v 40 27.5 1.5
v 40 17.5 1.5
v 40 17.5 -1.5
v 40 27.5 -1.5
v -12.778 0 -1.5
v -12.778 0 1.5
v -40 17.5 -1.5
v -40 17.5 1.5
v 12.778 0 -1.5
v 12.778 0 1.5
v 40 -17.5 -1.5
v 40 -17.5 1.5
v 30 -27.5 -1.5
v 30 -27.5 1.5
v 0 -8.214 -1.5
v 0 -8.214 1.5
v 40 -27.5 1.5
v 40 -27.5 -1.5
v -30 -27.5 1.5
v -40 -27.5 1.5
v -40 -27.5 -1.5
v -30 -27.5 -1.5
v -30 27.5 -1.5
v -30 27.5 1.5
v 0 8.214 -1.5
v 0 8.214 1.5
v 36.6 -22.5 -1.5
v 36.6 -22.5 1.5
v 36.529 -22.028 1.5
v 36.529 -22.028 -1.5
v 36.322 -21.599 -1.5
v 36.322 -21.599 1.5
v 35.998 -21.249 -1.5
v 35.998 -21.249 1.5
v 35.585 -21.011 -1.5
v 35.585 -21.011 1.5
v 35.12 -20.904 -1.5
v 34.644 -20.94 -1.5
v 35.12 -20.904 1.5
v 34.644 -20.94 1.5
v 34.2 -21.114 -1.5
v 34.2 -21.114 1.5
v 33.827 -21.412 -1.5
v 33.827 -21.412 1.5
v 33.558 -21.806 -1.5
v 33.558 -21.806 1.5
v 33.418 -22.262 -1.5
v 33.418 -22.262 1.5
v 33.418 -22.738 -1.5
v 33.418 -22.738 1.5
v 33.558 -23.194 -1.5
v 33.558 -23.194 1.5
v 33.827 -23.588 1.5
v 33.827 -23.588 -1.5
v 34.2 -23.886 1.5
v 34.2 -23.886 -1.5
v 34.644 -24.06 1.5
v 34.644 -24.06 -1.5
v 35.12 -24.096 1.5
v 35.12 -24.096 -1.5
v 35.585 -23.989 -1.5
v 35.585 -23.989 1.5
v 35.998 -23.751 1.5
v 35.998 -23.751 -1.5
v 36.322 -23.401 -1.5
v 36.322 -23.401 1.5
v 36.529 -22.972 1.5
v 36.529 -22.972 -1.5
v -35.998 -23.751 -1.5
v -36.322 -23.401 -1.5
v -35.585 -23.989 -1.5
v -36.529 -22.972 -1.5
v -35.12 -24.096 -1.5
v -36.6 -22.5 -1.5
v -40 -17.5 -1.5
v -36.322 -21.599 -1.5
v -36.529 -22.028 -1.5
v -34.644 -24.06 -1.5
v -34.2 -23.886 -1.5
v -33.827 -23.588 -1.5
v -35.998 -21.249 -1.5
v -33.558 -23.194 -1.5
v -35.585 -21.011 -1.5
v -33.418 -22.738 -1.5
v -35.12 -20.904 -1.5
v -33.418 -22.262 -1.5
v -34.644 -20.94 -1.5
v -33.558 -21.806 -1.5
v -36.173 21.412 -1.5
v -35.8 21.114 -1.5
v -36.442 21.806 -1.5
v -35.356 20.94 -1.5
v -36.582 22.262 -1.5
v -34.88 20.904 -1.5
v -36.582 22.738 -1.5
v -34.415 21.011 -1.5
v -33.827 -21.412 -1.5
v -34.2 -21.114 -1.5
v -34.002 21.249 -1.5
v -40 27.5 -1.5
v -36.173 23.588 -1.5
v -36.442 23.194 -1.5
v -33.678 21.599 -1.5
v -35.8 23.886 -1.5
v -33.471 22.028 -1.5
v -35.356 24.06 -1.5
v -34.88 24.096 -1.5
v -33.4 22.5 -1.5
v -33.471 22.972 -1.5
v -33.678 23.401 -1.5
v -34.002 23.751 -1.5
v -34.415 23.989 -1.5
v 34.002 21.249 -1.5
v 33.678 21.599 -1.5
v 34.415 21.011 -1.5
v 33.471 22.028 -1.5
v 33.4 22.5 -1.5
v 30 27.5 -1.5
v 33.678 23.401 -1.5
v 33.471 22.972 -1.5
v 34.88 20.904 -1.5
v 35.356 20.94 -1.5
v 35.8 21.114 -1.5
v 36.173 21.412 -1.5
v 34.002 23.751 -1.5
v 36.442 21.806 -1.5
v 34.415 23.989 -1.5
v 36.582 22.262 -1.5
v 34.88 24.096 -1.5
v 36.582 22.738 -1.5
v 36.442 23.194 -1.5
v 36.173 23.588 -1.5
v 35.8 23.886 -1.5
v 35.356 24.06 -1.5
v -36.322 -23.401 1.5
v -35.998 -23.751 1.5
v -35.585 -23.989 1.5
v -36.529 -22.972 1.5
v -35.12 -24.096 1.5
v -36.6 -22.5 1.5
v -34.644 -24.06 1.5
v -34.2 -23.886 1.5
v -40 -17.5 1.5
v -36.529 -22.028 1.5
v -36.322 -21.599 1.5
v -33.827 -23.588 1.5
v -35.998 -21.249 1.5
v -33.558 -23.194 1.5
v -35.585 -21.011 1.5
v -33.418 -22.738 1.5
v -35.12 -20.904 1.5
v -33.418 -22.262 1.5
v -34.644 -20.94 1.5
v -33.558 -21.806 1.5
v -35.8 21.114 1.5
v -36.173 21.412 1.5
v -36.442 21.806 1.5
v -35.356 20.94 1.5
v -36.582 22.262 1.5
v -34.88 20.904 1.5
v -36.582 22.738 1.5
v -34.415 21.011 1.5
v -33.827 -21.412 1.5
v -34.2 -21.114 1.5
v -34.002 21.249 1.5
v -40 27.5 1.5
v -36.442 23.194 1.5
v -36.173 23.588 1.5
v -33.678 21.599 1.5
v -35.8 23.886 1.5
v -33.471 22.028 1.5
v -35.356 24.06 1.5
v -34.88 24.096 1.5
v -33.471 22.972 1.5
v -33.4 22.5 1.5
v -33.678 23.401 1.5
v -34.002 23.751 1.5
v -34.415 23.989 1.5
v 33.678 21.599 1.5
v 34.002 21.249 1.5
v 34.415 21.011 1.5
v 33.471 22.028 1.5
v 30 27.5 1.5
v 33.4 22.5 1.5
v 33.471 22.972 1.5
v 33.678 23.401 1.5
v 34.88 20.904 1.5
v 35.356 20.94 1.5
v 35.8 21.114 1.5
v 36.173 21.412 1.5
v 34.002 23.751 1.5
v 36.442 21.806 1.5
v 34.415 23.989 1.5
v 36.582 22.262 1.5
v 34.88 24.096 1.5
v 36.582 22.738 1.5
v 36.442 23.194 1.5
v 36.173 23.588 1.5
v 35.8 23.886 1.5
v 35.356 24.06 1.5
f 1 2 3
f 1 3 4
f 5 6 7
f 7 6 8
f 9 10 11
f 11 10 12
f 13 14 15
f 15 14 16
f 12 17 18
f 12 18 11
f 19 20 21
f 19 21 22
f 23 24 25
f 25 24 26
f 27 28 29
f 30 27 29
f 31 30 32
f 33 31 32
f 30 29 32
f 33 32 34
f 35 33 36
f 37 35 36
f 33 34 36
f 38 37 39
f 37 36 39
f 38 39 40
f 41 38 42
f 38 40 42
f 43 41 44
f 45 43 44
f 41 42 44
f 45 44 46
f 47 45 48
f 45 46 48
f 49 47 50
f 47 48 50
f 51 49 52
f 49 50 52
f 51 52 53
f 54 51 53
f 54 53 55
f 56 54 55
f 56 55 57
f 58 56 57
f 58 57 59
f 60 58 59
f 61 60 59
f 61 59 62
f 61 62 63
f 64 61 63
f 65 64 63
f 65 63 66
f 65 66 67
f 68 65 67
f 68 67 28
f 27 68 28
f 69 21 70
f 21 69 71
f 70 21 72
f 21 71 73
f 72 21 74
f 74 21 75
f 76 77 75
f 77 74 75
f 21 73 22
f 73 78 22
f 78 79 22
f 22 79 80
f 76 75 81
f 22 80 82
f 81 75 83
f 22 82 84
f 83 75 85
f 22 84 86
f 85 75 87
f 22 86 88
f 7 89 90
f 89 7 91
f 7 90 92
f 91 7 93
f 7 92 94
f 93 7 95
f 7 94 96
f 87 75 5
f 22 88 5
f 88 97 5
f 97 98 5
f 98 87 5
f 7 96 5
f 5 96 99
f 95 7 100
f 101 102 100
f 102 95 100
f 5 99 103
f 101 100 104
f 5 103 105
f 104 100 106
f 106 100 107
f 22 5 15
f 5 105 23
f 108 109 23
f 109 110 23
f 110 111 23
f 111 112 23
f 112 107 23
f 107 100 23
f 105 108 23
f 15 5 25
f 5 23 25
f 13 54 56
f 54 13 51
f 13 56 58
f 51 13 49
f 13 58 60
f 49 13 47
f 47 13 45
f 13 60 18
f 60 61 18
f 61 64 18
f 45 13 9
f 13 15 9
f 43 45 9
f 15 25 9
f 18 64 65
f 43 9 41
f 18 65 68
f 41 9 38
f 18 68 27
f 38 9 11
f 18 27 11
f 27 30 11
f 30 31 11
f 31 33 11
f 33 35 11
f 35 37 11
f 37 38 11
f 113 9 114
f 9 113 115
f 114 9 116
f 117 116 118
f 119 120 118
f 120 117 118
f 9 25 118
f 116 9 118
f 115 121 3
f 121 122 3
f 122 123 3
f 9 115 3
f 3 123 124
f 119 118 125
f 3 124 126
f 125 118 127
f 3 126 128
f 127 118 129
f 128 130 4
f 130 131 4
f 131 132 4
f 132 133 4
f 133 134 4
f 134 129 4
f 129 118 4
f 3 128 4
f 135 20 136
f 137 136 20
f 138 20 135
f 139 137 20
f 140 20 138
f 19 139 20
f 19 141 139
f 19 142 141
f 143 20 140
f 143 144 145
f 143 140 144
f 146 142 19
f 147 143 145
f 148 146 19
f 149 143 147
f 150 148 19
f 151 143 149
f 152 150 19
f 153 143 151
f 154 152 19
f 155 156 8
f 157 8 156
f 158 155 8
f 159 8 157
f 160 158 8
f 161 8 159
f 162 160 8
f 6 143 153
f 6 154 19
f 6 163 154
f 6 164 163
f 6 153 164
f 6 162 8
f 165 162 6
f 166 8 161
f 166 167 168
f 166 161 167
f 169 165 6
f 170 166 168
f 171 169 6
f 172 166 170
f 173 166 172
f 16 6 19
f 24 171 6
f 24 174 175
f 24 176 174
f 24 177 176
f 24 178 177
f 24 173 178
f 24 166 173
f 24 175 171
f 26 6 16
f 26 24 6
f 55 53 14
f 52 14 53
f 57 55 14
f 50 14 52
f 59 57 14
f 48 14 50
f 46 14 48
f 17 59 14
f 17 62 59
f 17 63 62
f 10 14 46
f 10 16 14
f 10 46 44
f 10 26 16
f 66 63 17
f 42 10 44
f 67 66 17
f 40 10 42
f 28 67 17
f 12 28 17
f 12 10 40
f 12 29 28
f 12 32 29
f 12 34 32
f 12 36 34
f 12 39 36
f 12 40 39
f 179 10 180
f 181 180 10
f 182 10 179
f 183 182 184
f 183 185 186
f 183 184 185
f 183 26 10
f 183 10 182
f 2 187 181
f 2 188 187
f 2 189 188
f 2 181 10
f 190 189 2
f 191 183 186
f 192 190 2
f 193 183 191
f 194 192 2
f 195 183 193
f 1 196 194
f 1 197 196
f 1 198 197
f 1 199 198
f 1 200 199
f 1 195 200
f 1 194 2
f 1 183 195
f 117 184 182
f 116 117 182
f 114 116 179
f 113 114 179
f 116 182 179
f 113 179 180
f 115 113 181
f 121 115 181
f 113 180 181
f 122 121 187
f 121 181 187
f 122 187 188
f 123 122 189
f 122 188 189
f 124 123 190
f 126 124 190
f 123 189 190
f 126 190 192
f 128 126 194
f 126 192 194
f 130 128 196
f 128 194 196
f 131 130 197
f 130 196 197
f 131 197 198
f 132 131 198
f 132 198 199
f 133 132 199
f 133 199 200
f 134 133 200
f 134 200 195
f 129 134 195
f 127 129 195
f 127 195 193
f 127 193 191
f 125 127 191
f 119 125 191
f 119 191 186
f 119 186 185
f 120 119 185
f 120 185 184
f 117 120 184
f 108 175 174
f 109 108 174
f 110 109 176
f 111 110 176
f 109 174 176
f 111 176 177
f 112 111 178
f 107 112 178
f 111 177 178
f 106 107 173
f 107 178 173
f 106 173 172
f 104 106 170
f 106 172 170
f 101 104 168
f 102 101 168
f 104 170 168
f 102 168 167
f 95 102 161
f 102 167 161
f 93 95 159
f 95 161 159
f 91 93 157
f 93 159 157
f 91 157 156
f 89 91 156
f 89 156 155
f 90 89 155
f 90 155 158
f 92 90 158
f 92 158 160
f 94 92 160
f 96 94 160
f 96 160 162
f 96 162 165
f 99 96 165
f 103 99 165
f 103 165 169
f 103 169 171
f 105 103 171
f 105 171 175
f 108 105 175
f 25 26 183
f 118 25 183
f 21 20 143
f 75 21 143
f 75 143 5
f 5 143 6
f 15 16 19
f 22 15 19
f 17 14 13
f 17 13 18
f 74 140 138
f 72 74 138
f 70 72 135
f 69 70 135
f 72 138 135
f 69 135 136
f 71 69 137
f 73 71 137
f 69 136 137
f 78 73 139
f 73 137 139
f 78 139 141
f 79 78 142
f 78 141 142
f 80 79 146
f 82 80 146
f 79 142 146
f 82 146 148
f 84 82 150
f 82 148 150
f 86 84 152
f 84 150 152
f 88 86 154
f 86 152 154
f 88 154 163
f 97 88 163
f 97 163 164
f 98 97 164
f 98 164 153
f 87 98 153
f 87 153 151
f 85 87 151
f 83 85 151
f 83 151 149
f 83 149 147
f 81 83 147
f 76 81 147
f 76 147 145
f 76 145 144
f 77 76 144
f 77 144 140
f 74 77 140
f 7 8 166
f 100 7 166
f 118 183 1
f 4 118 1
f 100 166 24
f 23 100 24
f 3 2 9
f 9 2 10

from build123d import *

# Parameters (mm, degrees)
SKETCH_1_W          = 80
SKETCH_1_H          = 55
EXTRUDE_1_DEPTH     = 1.5
SKETCH_3_R          = 1.6
CUT_EXTRUDE_2_DEPTH = 49.633835958
CUT_EXTRUDE_3_DEPTH = 10


with BuildPart() as part:
    # ｽｹｯﾁ1 → ﾎﾞｽ - 押し出し1 (new, symmetric)
    with BuildSketch(Plane.XY):
        Rectangle(SKETCH_1_W, SKETCH_1_H)
    extrude(amount=EXTRUDE_1_DEPTH, both=True)

    # ｽｹｯﾁ3 → ｶｯﾄ - 押し出し2 (cut, through all)
    with BuildSketch(Plane.XY.offset(1.5)):
        with Locations((-35, 22.5)):
            Circle(SKETCH_3_R)
        with Locations(Location((35, 22.5, 0), (0, 0, 180))):
            Circle(SKETCH_3_R)
        with Locations((35, -22.5)):
            Circle(SKETCH_3_R)
        with Locations(Location((-35, -22.5, 0), (0, 0, 180))):
            Circle(SKETCH_3_R)
    extrude(amount=-CUT_EXTRUDE_2_DEPTH, mode=Mode.SUBTRACT)

    # ｽｹｯﾁ4 → ｶｯﾄ - 押し出し3 (cut)
    with BuildSketch(Plane.XY.offset(1.5)):
        Polygon((30, 27.5), (-30, 27.5), (0, 8.214285714), align=None)
        Polygon((-40, -17.5), (-12.777777778, 0), (-40, 17.5), align=None)
        Polygon((30, -27.5), (0, -8.214285714), (-30, -27.5), align=None)
        Polygon((40, 17.5), (12.777777778, 0), (40, -17.5), align=None)
    extrude(amount=-CUT_EXTRUDE_3_DEPTH, mode=Mode.SUBTRACT)


solid = part.part
